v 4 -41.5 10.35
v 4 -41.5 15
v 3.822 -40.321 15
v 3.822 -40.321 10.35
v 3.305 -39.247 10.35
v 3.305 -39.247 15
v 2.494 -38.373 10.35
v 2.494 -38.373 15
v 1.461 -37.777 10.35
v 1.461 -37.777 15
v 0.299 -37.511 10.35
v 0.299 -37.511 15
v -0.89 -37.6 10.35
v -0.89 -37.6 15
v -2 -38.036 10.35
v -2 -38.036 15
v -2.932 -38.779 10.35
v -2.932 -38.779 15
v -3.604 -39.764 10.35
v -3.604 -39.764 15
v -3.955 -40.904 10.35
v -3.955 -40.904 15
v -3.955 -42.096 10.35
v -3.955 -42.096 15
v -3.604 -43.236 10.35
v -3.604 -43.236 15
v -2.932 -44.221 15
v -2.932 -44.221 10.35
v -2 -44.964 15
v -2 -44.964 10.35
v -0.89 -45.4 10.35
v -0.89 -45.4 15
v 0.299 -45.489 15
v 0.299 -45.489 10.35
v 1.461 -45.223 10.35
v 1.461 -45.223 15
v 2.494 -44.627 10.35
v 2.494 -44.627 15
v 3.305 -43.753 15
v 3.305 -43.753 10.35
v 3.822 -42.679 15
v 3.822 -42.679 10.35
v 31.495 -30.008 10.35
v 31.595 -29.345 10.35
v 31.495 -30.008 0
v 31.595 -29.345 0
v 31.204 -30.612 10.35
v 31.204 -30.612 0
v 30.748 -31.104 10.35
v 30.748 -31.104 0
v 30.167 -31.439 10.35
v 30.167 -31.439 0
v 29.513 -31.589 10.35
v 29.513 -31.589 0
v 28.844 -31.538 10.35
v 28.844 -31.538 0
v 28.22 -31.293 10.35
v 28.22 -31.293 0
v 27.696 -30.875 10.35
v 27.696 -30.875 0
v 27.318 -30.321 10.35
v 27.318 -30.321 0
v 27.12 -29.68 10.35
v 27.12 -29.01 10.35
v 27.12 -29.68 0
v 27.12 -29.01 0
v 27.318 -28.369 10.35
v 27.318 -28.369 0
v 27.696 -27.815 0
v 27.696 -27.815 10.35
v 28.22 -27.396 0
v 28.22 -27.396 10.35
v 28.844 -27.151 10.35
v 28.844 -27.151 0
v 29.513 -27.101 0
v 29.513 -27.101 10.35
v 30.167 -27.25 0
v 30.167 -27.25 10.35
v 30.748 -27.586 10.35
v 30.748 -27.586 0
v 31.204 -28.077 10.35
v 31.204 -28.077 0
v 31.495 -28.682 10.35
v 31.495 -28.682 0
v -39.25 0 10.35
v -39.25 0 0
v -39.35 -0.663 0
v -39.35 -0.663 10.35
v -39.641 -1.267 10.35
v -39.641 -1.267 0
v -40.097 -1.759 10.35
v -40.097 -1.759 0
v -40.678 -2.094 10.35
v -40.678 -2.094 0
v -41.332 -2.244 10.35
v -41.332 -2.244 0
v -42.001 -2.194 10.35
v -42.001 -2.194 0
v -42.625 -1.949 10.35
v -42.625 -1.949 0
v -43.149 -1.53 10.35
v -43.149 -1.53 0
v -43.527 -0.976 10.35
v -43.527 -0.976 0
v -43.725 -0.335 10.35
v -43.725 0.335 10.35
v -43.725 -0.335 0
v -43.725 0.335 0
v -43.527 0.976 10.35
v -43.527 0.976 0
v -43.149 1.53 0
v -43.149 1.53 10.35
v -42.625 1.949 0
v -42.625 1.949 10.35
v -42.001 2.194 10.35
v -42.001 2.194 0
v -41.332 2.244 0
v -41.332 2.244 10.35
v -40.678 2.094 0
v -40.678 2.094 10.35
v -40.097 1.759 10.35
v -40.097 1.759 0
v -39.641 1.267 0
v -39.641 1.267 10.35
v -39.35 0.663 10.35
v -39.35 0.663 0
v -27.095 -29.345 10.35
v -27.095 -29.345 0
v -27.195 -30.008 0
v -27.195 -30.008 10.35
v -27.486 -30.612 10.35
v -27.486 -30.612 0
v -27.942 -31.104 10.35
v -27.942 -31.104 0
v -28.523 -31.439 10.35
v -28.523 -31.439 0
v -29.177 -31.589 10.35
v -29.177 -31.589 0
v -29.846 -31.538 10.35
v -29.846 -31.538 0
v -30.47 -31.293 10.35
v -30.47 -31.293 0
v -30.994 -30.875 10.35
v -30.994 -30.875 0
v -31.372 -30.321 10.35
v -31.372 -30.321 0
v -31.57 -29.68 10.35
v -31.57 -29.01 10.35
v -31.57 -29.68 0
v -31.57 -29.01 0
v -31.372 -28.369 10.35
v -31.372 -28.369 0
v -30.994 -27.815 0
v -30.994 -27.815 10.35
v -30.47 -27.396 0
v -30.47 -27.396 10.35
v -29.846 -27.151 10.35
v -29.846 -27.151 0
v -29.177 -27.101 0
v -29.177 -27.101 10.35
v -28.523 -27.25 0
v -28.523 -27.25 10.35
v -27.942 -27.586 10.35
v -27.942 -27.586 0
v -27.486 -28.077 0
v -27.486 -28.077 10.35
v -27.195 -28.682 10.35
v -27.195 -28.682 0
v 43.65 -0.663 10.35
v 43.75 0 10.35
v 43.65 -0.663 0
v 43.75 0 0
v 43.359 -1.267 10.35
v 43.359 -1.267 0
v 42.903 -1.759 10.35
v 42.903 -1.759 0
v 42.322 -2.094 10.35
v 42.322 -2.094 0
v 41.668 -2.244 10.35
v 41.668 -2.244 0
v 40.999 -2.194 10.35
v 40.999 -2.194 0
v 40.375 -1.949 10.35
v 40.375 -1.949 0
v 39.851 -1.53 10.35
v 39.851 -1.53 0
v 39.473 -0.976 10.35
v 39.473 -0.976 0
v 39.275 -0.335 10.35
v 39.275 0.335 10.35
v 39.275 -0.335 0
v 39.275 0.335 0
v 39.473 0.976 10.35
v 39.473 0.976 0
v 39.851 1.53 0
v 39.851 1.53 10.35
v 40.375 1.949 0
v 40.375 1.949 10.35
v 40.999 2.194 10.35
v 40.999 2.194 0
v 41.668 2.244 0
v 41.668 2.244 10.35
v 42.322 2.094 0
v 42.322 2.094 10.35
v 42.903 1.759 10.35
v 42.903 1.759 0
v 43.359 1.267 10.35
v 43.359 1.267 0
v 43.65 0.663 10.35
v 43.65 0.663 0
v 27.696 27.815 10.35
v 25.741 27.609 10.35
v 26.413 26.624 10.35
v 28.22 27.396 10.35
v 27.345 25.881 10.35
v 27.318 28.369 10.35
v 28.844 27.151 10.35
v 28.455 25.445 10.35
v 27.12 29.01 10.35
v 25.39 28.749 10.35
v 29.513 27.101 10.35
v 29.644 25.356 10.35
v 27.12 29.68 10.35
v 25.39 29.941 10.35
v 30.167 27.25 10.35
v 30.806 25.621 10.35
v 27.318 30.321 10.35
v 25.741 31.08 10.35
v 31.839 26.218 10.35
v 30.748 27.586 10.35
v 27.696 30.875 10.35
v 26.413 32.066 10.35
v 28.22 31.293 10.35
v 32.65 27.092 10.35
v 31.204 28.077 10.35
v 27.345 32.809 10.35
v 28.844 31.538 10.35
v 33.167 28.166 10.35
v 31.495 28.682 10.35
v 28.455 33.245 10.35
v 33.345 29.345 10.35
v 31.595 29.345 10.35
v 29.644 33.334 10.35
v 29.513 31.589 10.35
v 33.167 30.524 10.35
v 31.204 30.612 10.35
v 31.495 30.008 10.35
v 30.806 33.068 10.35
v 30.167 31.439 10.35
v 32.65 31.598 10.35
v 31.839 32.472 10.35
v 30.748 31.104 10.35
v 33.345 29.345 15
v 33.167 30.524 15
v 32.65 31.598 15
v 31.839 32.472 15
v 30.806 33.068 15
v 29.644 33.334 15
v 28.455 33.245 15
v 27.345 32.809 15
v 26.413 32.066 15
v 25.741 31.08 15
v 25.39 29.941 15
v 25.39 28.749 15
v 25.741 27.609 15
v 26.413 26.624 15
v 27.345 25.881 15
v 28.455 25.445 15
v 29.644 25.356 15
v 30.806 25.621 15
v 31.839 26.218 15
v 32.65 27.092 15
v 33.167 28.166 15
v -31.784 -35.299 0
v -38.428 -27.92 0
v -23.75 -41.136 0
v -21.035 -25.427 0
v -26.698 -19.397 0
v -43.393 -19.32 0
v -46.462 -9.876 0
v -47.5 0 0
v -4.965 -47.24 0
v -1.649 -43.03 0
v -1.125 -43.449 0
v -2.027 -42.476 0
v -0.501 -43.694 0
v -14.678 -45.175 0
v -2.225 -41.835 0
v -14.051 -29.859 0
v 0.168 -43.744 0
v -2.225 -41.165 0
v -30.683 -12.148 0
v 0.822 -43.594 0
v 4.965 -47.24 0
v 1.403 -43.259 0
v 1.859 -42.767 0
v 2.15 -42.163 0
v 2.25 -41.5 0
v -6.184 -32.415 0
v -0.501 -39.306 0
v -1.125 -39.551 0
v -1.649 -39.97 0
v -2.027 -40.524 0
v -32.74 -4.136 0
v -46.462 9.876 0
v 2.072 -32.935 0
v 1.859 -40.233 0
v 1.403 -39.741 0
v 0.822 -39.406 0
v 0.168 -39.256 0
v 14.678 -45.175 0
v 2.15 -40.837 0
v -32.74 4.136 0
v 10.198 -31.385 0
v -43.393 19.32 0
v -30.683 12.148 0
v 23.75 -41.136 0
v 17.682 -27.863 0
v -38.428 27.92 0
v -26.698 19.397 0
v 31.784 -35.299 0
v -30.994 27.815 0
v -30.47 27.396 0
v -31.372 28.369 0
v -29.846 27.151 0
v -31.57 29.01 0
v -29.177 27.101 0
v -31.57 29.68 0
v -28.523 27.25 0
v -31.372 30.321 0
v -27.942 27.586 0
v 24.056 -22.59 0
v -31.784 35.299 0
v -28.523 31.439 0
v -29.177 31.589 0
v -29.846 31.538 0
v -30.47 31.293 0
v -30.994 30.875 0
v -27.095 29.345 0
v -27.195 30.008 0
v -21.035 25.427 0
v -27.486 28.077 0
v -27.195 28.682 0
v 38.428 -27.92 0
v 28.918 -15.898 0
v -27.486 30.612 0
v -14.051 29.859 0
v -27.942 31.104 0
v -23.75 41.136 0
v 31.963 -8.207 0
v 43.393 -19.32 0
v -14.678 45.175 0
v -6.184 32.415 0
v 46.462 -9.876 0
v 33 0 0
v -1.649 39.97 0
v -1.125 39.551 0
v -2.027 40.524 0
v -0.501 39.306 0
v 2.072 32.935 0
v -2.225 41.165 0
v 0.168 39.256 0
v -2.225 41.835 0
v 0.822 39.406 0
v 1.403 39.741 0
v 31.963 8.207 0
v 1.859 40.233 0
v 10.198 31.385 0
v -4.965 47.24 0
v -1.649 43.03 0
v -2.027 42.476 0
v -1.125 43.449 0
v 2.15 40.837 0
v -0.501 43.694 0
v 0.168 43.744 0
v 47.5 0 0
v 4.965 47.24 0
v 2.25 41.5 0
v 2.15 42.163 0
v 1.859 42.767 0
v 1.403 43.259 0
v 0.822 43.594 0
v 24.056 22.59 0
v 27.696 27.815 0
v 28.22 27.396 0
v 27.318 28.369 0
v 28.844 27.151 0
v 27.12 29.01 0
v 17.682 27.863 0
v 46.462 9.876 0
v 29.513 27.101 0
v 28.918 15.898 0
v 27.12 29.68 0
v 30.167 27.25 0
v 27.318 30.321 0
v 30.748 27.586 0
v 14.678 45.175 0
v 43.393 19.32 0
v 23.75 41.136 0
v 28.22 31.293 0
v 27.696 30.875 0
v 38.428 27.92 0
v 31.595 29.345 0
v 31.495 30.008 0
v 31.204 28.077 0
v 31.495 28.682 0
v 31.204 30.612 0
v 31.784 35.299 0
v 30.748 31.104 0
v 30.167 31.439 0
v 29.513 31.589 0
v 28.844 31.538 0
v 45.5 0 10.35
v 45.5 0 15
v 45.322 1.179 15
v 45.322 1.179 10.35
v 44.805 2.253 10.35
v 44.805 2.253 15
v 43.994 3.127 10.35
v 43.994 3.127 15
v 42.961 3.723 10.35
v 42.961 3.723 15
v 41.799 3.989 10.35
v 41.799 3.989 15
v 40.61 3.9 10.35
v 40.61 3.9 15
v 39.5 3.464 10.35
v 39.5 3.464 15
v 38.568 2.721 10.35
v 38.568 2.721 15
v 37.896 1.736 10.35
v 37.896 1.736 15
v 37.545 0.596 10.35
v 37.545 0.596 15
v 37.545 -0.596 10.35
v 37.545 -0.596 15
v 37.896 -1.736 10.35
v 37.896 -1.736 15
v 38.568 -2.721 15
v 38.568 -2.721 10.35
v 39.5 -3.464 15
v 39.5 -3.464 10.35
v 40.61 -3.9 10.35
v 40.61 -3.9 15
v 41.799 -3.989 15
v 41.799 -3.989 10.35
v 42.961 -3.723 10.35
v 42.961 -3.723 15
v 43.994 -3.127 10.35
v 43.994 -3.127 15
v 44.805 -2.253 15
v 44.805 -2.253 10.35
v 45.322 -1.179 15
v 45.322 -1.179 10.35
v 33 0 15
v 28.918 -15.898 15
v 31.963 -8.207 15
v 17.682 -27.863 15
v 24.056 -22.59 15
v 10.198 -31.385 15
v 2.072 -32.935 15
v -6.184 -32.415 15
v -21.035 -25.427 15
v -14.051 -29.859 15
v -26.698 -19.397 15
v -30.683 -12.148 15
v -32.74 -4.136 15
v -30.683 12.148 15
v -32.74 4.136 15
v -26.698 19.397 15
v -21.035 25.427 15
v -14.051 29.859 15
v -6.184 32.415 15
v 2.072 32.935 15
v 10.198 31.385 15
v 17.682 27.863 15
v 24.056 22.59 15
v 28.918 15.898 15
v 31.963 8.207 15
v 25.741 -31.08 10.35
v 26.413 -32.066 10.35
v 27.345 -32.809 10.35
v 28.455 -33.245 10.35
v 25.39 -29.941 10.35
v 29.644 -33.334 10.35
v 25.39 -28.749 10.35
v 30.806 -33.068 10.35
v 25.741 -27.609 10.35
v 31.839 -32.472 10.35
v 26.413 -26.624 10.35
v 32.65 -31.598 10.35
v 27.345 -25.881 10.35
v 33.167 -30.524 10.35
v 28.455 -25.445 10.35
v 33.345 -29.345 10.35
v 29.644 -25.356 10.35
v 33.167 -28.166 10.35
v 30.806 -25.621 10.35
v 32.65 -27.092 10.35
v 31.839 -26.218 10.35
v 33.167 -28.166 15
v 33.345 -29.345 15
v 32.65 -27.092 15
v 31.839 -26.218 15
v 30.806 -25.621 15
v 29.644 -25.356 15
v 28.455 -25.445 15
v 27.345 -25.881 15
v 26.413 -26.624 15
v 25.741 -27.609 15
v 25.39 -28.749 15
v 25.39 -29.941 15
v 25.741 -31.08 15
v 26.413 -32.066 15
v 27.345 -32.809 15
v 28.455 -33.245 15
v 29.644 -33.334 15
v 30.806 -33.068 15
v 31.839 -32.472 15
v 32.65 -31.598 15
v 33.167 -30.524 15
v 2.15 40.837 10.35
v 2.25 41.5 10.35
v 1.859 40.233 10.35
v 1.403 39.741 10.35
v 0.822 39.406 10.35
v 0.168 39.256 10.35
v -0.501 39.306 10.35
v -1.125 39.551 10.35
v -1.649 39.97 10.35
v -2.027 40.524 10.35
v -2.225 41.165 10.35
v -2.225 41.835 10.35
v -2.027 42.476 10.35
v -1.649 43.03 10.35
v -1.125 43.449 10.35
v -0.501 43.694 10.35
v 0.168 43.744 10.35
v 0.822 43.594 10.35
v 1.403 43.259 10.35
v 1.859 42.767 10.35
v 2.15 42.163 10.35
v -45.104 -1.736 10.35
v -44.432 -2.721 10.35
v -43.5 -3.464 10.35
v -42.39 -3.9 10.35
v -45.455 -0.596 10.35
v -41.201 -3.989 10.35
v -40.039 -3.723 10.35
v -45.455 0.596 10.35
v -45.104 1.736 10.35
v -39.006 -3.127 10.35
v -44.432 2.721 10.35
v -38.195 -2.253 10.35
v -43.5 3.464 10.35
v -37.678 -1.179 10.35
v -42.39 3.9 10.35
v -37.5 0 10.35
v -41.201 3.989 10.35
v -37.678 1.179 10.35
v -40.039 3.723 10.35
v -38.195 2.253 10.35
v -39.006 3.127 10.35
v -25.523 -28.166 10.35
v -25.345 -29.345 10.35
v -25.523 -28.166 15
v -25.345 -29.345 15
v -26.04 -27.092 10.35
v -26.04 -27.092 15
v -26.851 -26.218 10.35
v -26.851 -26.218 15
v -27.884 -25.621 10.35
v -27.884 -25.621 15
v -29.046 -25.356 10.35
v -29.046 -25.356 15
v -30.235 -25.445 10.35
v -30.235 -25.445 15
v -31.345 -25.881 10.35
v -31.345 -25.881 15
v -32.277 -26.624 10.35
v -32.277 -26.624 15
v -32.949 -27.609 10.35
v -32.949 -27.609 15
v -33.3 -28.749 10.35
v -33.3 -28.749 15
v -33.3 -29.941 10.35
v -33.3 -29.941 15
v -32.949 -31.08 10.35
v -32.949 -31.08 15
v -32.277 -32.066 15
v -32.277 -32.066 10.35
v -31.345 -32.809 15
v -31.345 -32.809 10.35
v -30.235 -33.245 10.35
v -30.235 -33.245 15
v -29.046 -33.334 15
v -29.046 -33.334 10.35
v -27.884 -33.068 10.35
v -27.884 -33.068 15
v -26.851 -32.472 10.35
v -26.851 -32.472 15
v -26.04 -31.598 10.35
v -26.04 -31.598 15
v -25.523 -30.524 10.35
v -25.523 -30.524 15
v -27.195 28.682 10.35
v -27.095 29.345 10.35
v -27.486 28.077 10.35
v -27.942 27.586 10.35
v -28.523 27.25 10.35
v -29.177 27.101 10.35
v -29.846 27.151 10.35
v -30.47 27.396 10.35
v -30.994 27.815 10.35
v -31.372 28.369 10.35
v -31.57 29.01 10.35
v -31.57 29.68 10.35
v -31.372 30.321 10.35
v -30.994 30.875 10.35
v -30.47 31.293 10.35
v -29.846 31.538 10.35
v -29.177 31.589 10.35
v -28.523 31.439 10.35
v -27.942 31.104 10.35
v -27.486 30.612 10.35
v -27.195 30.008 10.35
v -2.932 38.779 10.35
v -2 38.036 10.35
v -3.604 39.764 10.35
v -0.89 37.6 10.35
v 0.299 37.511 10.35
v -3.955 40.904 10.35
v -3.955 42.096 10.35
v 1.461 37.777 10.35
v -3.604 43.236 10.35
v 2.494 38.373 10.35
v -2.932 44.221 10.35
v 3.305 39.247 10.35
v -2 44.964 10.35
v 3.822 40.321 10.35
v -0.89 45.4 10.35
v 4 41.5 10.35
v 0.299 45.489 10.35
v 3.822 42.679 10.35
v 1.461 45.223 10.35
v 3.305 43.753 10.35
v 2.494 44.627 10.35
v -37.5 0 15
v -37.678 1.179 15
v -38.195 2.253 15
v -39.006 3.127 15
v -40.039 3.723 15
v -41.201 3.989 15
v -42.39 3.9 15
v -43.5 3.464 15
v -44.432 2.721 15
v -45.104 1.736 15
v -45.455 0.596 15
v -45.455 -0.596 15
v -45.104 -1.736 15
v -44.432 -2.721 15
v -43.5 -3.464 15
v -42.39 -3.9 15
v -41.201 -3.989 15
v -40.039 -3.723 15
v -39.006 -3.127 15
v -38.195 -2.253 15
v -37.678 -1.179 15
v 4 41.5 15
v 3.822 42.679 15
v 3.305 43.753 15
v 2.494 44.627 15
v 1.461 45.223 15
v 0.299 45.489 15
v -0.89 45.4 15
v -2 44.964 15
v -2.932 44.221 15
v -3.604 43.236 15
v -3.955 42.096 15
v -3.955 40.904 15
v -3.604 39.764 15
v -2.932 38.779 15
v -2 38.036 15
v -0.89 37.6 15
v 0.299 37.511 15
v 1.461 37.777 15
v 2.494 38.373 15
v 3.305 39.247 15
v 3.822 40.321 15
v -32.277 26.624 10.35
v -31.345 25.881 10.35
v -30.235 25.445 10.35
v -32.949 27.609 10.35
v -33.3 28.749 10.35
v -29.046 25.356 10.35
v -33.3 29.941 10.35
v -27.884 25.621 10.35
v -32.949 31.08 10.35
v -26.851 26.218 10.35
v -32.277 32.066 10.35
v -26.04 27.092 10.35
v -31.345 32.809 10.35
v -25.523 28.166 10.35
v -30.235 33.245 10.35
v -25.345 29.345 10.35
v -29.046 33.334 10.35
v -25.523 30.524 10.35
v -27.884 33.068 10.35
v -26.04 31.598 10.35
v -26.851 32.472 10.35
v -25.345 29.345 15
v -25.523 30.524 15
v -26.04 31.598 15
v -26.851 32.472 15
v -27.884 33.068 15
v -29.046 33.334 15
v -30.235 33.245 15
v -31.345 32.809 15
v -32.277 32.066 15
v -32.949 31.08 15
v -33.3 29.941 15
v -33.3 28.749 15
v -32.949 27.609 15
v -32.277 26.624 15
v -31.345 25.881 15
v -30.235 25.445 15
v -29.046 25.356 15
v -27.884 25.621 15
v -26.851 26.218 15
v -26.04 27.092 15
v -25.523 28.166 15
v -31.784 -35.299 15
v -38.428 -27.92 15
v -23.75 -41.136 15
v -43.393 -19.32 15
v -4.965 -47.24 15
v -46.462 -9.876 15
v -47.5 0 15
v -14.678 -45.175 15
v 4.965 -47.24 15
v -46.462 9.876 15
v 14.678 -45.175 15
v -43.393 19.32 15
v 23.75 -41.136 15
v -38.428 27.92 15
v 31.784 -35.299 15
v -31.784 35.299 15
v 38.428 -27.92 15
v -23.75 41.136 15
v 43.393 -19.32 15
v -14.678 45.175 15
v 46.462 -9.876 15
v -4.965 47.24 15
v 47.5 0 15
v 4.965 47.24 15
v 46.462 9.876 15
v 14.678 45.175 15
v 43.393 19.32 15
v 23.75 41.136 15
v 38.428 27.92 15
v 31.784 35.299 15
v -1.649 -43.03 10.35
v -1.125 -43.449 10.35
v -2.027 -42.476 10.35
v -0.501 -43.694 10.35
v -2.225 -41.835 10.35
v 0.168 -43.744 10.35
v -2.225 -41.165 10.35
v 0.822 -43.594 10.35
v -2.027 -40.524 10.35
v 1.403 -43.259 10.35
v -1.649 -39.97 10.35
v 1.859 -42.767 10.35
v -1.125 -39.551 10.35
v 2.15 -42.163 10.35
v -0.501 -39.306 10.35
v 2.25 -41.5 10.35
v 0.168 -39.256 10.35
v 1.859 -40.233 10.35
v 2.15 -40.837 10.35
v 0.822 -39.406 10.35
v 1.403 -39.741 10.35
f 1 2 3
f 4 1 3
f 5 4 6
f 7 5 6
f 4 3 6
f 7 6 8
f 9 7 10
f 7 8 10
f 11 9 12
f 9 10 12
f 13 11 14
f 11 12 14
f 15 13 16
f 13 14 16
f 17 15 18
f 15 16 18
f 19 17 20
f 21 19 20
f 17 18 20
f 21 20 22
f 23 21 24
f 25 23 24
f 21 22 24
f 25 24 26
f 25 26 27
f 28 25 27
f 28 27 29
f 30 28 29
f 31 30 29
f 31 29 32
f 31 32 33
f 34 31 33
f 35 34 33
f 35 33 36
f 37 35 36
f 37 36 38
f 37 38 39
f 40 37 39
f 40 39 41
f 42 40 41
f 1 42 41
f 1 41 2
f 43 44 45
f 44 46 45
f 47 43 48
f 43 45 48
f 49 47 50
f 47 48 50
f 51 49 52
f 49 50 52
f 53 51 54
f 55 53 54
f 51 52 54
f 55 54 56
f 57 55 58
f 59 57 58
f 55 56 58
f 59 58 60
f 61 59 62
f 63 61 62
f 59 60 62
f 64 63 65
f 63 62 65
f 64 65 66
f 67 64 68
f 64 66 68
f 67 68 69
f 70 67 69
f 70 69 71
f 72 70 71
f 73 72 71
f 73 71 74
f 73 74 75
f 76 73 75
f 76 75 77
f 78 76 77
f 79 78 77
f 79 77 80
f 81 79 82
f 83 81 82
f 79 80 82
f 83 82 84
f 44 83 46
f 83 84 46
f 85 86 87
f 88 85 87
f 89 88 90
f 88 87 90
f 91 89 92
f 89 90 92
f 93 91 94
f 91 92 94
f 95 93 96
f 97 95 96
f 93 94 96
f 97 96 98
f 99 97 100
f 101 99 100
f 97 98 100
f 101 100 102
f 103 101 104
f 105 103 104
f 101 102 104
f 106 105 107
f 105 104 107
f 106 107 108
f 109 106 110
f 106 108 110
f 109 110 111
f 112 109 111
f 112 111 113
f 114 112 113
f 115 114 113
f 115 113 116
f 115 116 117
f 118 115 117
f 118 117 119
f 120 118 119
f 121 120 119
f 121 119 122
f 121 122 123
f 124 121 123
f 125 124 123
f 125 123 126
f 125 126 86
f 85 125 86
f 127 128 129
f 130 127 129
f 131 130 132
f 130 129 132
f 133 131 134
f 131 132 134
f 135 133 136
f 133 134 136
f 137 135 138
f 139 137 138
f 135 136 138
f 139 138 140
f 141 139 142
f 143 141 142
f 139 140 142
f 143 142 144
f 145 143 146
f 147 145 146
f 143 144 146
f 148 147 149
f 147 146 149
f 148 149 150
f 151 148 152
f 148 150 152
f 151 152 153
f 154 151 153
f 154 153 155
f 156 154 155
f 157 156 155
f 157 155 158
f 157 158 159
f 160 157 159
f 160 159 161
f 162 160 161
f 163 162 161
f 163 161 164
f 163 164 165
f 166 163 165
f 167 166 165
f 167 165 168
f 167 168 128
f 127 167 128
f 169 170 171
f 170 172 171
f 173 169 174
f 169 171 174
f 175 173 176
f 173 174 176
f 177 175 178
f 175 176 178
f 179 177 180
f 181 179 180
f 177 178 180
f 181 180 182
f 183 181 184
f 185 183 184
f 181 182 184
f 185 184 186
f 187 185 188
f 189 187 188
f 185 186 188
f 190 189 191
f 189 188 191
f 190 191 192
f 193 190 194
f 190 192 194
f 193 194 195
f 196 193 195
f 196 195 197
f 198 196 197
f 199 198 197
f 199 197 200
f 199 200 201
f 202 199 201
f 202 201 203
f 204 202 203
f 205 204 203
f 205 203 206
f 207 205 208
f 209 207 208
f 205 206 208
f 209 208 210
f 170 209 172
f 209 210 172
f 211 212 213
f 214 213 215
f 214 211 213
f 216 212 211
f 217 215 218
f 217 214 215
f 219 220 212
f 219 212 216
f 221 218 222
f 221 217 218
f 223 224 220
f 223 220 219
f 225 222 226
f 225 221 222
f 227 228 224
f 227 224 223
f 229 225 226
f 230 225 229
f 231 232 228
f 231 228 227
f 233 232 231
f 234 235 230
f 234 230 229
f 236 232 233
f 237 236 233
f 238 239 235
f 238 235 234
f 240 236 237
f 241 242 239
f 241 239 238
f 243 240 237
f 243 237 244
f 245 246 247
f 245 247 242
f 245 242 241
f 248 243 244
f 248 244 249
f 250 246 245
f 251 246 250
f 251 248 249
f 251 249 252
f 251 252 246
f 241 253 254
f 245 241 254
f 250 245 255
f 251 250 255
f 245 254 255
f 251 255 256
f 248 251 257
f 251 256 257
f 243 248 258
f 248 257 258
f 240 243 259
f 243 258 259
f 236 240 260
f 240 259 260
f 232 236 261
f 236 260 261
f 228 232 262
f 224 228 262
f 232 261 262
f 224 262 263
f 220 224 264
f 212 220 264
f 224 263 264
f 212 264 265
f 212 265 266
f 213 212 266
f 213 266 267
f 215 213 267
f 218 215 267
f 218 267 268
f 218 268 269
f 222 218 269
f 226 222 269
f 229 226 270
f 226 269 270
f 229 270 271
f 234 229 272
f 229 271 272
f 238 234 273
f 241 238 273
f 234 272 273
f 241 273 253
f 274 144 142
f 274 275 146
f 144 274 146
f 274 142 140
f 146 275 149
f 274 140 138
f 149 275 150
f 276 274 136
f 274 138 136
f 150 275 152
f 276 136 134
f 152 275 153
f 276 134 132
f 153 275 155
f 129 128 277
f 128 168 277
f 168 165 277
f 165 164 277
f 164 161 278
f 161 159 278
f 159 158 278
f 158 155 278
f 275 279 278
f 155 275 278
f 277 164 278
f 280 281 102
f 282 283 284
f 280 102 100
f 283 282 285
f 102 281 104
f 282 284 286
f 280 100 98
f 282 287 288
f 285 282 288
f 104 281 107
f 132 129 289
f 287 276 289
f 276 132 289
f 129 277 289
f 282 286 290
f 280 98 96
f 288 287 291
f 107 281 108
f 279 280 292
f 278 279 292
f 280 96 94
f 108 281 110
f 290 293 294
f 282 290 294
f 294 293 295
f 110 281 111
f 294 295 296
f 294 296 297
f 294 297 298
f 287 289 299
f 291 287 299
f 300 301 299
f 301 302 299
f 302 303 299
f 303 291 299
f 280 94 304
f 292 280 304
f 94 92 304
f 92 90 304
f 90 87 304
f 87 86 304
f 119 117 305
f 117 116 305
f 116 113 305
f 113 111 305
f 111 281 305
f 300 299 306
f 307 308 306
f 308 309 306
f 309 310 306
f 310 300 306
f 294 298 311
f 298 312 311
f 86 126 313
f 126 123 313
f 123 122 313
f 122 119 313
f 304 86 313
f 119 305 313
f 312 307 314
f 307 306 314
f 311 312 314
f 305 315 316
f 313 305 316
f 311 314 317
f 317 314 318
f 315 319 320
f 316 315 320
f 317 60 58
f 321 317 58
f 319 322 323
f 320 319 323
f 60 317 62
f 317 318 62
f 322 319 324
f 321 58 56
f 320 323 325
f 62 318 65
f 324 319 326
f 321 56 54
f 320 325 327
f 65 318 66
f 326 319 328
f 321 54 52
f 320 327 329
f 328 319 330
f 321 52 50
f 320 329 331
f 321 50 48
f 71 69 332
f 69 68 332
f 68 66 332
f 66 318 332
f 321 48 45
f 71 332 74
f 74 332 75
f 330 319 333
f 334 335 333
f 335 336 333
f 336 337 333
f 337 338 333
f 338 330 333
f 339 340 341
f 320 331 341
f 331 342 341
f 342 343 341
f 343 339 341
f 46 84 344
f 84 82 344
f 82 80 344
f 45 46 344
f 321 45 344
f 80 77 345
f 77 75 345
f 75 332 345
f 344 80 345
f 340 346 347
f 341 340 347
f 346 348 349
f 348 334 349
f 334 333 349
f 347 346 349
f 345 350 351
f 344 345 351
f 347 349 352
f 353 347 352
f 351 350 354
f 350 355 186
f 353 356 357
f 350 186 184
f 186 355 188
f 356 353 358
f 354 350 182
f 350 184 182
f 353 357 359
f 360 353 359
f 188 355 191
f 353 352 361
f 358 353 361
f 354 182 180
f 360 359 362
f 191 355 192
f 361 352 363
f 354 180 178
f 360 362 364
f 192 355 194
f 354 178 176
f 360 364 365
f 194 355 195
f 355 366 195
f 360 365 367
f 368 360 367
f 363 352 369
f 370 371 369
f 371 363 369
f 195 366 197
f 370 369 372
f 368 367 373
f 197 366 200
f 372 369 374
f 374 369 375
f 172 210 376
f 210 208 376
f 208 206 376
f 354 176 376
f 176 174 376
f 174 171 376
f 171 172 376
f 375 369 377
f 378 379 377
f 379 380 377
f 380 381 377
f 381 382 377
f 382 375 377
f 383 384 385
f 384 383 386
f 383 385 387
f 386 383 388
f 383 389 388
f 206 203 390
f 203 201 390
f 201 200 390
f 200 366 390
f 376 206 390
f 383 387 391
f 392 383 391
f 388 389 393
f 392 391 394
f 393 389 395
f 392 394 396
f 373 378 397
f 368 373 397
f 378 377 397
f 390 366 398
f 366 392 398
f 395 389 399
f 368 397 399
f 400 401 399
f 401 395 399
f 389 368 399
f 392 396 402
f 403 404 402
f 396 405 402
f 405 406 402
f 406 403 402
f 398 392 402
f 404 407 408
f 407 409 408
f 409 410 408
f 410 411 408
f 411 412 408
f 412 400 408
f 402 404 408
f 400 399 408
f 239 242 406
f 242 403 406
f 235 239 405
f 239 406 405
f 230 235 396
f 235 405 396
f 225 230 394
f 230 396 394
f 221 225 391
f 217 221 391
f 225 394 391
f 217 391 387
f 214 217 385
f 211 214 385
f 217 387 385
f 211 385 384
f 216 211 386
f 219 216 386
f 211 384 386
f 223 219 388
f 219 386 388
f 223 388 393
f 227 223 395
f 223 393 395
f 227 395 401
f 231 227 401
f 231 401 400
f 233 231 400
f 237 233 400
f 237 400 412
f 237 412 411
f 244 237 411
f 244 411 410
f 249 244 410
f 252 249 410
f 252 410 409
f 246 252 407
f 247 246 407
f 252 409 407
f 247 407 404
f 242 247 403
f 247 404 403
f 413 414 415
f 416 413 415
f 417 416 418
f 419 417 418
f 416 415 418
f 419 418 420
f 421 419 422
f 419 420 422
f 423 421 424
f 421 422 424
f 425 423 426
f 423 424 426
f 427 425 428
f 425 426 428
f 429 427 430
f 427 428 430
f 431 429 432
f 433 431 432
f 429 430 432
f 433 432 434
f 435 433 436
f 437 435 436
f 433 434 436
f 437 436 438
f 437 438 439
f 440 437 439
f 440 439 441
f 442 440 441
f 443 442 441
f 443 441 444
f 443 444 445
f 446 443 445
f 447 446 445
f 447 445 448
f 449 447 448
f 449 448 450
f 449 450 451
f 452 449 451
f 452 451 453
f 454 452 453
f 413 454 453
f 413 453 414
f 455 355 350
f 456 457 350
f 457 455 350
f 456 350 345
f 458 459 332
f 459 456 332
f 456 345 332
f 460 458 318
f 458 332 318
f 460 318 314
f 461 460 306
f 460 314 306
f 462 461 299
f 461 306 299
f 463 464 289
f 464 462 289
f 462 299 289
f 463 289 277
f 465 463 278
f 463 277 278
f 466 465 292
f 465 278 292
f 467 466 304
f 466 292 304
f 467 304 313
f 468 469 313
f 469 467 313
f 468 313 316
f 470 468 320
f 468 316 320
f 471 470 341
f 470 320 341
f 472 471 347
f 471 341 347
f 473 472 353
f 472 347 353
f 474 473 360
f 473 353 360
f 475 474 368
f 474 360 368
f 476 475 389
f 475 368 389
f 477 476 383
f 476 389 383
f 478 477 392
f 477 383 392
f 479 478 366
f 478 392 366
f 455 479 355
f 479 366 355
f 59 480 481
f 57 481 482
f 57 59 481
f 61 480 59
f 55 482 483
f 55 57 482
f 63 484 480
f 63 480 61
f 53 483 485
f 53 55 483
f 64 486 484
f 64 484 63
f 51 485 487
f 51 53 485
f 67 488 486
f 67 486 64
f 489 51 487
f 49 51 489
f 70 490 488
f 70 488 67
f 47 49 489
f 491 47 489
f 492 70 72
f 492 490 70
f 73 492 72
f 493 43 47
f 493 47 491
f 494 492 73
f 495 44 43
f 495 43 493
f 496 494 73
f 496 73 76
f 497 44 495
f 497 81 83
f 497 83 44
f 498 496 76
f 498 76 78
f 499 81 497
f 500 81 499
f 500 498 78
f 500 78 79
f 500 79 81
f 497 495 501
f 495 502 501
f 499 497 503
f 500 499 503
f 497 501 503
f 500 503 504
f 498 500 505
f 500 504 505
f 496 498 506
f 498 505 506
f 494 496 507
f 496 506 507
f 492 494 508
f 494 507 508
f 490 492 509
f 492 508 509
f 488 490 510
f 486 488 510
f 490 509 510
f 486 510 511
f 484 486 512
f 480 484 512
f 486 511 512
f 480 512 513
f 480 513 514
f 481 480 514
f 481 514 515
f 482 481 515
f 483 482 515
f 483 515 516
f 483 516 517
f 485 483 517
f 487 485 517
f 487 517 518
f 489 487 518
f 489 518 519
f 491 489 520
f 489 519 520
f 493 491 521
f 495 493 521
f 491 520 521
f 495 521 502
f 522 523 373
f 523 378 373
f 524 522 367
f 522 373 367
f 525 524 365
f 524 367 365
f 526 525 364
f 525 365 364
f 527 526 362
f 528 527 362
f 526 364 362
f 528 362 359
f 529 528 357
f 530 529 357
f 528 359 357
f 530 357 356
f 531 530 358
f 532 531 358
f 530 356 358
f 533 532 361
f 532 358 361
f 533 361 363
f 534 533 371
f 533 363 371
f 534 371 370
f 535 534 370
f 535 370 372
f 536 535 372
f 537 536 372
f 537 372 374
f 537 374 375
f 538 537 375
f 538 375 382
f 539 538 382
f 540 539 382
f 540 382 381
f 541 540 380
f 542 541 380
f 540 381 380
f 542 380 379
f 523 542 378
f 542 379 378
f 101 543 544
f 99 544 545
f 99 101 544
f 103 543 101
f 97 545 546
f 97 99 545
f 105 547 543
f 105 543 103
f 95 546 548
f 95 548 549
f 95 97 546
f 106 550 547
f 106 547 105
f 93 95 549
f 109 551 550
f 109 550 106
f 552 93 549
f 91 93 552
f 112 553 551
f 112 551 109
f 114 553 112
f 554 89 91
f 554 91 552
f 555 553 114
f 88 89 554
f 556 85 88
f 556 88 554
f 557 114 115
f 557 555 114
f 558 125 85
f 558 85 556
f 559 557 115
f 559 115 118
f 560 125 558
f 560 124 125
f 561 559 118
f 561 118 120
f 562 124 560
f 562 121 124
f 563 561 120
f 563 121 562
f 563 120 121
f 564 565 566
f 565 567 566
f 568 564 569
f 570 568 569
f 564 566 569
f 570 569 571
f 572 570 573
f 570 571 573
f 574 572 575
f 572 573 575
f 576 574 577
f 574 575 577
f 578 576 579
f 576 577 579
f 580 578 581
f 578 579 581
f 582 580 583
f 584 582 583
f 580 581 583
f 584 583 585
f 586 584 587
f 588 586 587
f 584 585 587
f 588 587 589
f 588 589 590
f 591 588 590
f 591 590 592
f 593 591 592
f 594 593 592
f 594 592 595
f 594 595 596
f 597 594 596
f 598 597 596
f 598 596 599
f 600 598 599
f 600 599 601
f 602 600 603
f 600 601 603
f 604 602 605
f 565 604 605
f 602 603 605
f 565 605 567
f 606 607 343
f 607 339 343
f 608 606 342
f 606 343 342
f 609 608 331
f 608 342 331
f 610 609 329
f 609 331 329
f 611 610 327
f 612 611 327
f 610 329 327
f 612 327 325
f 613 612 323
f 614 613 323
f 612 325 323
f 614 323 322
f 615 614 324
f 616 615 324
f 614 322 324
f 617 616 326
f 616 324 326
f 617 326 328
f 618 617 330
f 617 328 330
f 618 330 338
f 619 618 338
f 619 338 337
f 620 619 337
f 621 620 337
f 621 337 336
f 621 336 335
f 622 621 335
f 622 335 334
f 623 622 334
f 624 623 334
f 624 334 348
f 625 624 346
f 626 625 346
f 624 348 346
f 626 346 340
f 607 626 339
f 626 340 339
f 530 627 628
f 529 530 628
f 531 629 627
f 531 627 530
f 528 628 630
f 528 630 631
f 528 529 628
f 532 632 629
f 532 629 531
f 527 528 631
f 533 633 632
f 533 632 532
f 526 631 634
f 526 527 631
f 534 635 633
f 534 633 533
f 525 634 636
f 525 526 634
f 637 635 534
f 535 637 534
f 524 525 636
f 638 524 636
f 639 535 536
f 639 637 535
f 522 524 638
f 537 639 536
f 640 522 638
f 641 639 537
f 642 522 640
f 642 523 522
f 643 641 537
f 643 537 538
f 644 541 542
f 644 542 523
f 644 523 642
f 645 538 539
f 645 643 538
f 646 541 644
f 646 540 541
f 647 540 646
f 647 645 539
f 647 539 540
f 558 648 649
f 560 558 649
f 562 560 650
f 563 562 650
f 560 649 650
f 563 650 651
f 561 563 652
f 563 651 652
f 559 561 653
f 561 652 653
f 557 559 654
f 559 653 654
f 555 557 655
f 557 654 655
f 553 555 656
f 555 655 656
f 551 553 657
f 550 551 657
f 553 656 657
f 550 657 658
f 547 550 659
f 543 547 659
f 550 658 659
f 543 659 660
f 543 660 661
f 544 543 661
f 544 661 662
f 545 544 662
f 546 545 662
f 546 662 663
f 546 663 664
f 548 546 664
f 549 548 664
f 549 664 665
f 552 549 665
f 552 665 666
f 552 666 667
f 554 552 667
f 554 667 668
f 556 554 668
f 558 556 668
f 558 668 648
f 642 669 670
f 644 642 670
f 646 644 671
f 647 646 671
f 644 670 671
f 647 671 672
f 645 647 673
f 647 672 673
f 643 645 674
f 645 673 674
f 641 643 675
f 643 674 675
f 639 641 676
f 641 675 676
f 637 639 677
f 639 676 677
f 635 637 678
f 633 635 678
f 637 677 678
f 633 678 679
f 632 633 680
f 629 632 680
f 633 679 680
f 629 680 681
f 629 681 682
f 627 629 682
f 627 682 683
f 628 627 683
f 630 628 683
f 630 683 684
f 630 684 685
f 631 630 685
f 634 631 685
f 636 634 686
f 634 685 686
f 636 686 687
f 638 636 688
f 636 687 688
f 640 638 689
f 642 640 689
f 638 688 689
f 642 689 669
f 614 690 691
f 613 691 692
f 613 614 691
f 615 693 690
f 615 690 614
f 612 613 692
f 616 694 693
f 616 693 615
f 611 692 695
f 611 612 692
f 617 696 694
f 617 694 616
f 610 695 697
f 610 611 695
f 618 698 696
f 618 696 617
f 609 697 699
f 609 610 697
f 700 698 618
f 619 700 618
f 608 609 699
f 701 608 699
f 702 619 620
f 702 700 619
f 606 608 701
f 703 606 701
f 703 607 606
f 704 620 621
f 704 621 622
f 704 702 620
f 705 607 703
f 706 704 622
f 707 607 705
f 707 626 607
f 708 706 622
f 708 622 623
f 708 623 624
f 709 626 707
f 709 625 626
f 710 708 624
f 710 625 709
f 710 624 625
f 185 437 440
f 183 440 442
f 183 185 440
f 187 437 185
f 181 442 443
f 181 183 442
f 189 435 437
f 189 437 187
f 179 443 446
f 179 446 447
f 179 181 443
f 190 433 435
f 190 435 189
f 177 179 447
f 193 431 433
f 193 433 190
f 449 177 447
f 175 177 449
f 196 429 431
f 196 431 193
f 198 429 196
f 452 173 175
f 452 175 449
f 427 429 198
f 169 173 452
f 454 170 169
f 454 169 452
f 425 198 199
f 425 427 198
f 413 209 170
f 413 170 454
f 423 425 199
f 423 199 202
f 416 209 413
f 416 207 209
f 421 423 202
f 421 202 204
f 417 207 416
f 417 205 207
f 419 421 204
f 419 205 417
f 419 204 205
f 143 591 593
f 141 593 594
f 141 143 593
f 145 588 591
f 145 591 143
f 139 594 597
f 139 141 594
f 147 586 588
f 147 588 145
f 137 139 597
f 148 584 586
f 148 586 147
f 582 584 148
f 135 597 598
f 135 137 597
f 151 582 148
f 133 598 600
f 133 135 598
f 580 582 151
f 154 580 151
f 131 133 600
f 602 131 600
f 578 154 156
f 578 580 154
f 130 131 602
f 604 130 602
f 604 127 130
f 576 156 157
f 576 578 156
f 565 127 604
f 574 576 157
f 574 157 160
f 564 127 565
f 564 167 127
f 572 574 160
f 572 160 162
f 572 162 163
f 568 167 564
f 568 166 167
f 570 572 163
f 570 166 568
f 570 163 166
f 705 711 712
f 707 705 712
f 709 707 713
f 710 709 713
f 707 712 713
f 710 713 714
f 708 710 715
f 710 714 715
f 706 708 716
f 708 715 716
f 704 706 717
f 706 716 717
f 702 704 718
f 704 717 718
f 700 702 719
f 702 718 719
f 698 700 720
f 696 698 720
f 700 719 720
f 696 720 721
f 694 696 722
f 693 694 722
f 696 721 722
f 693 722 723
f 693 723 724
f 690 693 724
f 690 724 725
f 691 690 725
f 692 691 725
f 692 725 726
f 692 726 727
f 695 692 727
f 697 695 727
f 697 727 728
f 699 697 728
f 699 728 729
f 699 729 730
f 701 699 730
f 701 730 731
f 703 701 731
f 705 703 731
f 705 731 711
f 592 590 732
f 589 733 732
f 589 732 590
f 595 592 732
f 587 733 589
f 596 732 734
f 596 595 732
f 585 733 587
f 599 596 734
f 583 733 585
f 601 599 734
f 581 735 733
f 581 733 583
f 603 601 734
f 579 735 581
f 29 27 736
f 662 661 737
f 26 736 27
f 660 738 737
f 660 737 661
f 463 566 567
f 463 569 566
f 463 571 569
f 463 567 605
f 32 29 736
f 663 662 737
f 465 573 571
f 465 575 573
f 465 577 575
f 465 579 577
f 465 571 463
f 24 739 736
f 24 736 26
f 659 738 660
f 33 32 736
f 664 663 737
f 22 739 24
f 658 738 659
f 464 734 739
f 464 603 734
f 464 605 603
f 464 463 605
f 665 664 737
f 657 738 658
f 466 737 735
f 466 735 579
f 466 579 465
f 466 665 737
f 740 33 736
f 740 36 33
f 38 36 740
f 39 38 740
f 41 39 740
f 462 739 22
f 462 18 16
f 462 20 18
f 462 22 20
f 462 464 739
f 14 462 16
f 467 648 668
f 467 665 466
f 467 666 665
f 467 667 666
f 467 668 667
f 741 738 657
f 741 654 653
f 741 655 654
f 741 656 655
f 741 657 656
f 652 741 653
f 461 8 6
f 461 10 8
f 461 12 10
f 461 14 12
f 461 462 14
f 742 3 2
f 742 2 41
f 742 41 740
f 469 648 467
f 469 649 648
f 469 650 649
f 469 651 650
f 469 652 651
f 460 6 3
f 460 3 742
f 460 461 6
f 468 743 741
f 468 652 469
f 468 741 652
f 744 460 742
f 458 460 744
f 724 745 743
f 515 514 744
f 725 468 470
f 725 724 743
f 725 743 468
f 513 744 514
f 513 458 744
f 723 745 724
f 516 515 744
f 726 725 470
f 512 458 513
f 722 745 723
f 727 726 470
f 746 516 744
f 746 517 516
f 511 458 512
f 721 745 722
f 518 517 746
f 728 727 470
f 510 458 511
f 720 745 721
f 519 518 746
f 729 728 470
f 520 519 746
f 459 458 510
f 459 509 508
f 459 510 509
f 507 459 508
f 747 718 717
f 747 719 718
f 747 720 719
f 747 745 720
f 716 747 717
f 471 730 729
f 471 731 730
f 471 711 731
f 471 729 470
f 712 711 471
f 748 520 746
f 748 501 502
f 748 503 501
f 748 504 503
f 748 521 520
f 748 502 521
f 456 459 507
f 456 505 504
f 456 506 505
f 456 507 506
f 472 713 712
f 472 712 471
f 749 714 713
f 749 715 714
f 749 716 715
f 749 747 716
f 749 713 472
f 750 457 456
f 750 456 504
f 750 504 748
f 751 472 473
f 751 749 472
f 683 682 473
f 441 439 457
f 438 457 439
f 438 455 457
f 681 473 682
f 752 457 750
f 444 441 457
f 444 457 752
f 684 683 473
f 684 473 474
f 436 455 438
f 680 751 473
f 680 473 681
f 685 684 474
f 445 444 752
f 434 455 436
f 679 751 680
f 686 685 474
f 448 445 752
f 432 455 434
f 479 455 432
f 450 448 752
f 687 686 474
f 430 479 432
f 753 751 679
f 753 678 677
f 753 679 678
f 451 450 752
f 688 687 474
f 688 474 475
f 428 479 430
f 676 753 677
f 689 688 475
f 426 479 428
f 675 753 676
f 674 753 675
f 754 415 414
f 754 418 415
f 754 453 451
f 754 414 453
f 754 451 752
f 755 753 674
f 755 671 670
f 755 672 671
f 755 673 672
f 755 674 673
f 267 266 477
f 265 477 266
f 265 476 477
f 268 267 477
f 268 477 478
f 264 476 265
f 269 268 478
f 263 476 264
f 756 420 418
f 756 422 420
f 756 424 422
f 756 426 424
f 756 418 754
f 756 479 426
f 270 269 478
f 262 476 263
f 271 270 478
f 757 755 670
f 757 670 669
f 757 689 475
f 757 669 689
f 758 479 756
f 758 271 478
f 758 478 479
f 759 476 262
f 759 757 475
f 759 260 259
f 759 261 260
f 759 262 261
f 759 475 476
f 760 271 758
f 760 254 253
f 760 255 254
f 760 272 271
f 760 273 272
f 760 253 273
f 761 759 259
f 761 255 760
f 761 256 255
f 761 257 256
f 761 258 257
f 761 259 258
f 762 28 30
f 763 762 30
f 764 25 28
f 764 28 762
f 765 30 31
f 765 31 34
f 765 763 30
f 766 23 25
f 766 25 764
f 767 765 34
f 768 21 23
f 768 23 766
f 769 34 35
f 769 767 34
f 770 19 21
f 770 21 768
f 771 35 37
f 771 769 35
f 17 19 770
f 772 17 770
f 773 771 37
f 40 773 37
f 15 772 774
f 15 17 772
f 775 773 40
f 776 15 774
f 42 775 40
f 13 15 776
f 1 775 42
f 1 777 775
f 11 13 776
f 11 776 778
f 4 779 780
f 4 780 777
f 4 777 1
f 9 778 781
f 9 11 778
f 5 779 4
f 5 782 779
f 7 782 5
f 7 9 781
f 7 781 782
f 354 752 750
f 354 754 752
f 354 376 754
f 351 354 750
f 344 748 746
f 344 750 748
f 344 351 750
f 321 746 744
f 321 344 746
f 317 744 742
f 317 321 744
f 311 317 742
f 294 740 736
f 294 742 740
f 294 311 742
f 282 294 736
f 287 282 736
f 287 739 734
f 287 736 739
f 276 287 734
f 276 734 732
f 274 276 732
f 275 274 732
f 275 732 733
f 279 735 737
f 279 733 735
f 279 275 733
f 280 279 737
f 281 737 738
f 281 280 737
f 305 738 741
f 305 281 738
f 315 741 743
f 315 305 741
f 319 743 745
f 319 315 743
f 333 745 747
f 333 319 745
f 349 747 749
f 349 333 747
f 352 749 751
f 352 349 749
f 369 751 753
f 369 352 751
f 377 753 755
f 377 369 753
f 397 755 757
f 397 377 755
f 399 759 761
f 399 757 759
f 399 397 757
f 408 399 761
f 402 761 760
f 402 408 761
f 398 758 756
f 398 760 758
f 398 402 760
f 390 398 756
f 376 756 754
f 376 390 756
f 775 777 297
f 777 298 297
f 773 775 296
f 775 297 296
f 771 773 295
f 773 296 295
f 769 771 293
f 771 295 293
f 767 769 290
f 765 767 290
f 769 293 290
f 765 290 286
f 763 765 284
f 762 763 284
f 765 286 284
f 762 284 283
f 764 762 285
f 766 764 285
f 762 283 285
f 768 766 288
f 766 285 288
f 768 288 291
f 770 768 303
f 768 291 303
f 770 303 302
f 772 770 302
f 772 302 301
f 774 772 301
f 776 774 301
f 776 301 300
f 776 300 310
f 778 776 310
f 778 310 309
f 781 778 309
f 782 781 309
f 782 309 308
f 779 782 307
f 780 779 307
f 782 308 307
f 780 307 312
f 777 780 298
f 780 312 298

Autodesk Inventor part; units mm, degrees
ref_plane "YZ Plane" through (0, 0, 0) normal (1, 0, 0) x (0, 1, 0)
ref_plane "XZ Plane" through (0, 0, 0) normal (0, 1, 0) x (-1, 0, 0)
ref_plane "XY Plane" through (0, 0, 0) normal (0, 0, 1) x (1, 0, 0)
sketch "Sketch1" plane through (0, 0, 0) normal (0, 0, 1) x (1, 0, 0)
  circle A0 centre (0, 0) radius 47.5
  circle A1 centre (0, 0) radius 33
  circle A2 centre (41.5, 0) radius 2.25
  circle A3 centre (29.3449, 29.3449) radius 2.25
  circle A4 centre (0, 41.5) radius 2.25
  circle A5 centre (-29.3449, 29.3449) radius 2.25
  circle A6 centre (-41.5, 0) radius 2.25
  circle A7 centre (-29.3449, -29.3449) radius 2.25
  circle A8 centre (0, -41.5) radius 2.25
  circle A9 centre (29.3449, -29.3449) radius 2.25
  dimension "d0" = 95
  dimension "d1" = 66
  dimension "d2" = 4.5
  dimension "d3" = 41.5
  dimension "d6" = 360
extrude "Extrusion1" add sketch "Sketch1" along normal blind 15
sketch "Sketch2" plane through (0, 0, 15) normal (0, 0, 1) x (1, 0, 0)
  circle A0 centre (41.5, 0) radius 2.25 projected
  circle A1 centre (41.5, 0) radius 4
  circle A2 centre (29.3449, 29.3449) radius 4
  circle A3 centre (0, 41.5) radius 4
  circle A4 centre (-29.3449, 29.3449) radius 4
  circle A5 centre (-41.5, 0) radius 4
  circle A6 centre (-29.3449, -29.3449) radius 4
  circle A7 centre (0, -41.5) radius 4
  circle A8 centre (29.3449, -29.3449) radius 4
  point P0 (0, 0)
  dimension "d10" = 8
  dimension "d13" = 360
extrude "Extrusion2" cut sketch "Sketch2" against normal blind 4.65 contours A0 | A1 | A2 | A3 | A4 | A5 | A6 | A7 | A8
properties part number "Slewing A" material "Aluminum 6061"
